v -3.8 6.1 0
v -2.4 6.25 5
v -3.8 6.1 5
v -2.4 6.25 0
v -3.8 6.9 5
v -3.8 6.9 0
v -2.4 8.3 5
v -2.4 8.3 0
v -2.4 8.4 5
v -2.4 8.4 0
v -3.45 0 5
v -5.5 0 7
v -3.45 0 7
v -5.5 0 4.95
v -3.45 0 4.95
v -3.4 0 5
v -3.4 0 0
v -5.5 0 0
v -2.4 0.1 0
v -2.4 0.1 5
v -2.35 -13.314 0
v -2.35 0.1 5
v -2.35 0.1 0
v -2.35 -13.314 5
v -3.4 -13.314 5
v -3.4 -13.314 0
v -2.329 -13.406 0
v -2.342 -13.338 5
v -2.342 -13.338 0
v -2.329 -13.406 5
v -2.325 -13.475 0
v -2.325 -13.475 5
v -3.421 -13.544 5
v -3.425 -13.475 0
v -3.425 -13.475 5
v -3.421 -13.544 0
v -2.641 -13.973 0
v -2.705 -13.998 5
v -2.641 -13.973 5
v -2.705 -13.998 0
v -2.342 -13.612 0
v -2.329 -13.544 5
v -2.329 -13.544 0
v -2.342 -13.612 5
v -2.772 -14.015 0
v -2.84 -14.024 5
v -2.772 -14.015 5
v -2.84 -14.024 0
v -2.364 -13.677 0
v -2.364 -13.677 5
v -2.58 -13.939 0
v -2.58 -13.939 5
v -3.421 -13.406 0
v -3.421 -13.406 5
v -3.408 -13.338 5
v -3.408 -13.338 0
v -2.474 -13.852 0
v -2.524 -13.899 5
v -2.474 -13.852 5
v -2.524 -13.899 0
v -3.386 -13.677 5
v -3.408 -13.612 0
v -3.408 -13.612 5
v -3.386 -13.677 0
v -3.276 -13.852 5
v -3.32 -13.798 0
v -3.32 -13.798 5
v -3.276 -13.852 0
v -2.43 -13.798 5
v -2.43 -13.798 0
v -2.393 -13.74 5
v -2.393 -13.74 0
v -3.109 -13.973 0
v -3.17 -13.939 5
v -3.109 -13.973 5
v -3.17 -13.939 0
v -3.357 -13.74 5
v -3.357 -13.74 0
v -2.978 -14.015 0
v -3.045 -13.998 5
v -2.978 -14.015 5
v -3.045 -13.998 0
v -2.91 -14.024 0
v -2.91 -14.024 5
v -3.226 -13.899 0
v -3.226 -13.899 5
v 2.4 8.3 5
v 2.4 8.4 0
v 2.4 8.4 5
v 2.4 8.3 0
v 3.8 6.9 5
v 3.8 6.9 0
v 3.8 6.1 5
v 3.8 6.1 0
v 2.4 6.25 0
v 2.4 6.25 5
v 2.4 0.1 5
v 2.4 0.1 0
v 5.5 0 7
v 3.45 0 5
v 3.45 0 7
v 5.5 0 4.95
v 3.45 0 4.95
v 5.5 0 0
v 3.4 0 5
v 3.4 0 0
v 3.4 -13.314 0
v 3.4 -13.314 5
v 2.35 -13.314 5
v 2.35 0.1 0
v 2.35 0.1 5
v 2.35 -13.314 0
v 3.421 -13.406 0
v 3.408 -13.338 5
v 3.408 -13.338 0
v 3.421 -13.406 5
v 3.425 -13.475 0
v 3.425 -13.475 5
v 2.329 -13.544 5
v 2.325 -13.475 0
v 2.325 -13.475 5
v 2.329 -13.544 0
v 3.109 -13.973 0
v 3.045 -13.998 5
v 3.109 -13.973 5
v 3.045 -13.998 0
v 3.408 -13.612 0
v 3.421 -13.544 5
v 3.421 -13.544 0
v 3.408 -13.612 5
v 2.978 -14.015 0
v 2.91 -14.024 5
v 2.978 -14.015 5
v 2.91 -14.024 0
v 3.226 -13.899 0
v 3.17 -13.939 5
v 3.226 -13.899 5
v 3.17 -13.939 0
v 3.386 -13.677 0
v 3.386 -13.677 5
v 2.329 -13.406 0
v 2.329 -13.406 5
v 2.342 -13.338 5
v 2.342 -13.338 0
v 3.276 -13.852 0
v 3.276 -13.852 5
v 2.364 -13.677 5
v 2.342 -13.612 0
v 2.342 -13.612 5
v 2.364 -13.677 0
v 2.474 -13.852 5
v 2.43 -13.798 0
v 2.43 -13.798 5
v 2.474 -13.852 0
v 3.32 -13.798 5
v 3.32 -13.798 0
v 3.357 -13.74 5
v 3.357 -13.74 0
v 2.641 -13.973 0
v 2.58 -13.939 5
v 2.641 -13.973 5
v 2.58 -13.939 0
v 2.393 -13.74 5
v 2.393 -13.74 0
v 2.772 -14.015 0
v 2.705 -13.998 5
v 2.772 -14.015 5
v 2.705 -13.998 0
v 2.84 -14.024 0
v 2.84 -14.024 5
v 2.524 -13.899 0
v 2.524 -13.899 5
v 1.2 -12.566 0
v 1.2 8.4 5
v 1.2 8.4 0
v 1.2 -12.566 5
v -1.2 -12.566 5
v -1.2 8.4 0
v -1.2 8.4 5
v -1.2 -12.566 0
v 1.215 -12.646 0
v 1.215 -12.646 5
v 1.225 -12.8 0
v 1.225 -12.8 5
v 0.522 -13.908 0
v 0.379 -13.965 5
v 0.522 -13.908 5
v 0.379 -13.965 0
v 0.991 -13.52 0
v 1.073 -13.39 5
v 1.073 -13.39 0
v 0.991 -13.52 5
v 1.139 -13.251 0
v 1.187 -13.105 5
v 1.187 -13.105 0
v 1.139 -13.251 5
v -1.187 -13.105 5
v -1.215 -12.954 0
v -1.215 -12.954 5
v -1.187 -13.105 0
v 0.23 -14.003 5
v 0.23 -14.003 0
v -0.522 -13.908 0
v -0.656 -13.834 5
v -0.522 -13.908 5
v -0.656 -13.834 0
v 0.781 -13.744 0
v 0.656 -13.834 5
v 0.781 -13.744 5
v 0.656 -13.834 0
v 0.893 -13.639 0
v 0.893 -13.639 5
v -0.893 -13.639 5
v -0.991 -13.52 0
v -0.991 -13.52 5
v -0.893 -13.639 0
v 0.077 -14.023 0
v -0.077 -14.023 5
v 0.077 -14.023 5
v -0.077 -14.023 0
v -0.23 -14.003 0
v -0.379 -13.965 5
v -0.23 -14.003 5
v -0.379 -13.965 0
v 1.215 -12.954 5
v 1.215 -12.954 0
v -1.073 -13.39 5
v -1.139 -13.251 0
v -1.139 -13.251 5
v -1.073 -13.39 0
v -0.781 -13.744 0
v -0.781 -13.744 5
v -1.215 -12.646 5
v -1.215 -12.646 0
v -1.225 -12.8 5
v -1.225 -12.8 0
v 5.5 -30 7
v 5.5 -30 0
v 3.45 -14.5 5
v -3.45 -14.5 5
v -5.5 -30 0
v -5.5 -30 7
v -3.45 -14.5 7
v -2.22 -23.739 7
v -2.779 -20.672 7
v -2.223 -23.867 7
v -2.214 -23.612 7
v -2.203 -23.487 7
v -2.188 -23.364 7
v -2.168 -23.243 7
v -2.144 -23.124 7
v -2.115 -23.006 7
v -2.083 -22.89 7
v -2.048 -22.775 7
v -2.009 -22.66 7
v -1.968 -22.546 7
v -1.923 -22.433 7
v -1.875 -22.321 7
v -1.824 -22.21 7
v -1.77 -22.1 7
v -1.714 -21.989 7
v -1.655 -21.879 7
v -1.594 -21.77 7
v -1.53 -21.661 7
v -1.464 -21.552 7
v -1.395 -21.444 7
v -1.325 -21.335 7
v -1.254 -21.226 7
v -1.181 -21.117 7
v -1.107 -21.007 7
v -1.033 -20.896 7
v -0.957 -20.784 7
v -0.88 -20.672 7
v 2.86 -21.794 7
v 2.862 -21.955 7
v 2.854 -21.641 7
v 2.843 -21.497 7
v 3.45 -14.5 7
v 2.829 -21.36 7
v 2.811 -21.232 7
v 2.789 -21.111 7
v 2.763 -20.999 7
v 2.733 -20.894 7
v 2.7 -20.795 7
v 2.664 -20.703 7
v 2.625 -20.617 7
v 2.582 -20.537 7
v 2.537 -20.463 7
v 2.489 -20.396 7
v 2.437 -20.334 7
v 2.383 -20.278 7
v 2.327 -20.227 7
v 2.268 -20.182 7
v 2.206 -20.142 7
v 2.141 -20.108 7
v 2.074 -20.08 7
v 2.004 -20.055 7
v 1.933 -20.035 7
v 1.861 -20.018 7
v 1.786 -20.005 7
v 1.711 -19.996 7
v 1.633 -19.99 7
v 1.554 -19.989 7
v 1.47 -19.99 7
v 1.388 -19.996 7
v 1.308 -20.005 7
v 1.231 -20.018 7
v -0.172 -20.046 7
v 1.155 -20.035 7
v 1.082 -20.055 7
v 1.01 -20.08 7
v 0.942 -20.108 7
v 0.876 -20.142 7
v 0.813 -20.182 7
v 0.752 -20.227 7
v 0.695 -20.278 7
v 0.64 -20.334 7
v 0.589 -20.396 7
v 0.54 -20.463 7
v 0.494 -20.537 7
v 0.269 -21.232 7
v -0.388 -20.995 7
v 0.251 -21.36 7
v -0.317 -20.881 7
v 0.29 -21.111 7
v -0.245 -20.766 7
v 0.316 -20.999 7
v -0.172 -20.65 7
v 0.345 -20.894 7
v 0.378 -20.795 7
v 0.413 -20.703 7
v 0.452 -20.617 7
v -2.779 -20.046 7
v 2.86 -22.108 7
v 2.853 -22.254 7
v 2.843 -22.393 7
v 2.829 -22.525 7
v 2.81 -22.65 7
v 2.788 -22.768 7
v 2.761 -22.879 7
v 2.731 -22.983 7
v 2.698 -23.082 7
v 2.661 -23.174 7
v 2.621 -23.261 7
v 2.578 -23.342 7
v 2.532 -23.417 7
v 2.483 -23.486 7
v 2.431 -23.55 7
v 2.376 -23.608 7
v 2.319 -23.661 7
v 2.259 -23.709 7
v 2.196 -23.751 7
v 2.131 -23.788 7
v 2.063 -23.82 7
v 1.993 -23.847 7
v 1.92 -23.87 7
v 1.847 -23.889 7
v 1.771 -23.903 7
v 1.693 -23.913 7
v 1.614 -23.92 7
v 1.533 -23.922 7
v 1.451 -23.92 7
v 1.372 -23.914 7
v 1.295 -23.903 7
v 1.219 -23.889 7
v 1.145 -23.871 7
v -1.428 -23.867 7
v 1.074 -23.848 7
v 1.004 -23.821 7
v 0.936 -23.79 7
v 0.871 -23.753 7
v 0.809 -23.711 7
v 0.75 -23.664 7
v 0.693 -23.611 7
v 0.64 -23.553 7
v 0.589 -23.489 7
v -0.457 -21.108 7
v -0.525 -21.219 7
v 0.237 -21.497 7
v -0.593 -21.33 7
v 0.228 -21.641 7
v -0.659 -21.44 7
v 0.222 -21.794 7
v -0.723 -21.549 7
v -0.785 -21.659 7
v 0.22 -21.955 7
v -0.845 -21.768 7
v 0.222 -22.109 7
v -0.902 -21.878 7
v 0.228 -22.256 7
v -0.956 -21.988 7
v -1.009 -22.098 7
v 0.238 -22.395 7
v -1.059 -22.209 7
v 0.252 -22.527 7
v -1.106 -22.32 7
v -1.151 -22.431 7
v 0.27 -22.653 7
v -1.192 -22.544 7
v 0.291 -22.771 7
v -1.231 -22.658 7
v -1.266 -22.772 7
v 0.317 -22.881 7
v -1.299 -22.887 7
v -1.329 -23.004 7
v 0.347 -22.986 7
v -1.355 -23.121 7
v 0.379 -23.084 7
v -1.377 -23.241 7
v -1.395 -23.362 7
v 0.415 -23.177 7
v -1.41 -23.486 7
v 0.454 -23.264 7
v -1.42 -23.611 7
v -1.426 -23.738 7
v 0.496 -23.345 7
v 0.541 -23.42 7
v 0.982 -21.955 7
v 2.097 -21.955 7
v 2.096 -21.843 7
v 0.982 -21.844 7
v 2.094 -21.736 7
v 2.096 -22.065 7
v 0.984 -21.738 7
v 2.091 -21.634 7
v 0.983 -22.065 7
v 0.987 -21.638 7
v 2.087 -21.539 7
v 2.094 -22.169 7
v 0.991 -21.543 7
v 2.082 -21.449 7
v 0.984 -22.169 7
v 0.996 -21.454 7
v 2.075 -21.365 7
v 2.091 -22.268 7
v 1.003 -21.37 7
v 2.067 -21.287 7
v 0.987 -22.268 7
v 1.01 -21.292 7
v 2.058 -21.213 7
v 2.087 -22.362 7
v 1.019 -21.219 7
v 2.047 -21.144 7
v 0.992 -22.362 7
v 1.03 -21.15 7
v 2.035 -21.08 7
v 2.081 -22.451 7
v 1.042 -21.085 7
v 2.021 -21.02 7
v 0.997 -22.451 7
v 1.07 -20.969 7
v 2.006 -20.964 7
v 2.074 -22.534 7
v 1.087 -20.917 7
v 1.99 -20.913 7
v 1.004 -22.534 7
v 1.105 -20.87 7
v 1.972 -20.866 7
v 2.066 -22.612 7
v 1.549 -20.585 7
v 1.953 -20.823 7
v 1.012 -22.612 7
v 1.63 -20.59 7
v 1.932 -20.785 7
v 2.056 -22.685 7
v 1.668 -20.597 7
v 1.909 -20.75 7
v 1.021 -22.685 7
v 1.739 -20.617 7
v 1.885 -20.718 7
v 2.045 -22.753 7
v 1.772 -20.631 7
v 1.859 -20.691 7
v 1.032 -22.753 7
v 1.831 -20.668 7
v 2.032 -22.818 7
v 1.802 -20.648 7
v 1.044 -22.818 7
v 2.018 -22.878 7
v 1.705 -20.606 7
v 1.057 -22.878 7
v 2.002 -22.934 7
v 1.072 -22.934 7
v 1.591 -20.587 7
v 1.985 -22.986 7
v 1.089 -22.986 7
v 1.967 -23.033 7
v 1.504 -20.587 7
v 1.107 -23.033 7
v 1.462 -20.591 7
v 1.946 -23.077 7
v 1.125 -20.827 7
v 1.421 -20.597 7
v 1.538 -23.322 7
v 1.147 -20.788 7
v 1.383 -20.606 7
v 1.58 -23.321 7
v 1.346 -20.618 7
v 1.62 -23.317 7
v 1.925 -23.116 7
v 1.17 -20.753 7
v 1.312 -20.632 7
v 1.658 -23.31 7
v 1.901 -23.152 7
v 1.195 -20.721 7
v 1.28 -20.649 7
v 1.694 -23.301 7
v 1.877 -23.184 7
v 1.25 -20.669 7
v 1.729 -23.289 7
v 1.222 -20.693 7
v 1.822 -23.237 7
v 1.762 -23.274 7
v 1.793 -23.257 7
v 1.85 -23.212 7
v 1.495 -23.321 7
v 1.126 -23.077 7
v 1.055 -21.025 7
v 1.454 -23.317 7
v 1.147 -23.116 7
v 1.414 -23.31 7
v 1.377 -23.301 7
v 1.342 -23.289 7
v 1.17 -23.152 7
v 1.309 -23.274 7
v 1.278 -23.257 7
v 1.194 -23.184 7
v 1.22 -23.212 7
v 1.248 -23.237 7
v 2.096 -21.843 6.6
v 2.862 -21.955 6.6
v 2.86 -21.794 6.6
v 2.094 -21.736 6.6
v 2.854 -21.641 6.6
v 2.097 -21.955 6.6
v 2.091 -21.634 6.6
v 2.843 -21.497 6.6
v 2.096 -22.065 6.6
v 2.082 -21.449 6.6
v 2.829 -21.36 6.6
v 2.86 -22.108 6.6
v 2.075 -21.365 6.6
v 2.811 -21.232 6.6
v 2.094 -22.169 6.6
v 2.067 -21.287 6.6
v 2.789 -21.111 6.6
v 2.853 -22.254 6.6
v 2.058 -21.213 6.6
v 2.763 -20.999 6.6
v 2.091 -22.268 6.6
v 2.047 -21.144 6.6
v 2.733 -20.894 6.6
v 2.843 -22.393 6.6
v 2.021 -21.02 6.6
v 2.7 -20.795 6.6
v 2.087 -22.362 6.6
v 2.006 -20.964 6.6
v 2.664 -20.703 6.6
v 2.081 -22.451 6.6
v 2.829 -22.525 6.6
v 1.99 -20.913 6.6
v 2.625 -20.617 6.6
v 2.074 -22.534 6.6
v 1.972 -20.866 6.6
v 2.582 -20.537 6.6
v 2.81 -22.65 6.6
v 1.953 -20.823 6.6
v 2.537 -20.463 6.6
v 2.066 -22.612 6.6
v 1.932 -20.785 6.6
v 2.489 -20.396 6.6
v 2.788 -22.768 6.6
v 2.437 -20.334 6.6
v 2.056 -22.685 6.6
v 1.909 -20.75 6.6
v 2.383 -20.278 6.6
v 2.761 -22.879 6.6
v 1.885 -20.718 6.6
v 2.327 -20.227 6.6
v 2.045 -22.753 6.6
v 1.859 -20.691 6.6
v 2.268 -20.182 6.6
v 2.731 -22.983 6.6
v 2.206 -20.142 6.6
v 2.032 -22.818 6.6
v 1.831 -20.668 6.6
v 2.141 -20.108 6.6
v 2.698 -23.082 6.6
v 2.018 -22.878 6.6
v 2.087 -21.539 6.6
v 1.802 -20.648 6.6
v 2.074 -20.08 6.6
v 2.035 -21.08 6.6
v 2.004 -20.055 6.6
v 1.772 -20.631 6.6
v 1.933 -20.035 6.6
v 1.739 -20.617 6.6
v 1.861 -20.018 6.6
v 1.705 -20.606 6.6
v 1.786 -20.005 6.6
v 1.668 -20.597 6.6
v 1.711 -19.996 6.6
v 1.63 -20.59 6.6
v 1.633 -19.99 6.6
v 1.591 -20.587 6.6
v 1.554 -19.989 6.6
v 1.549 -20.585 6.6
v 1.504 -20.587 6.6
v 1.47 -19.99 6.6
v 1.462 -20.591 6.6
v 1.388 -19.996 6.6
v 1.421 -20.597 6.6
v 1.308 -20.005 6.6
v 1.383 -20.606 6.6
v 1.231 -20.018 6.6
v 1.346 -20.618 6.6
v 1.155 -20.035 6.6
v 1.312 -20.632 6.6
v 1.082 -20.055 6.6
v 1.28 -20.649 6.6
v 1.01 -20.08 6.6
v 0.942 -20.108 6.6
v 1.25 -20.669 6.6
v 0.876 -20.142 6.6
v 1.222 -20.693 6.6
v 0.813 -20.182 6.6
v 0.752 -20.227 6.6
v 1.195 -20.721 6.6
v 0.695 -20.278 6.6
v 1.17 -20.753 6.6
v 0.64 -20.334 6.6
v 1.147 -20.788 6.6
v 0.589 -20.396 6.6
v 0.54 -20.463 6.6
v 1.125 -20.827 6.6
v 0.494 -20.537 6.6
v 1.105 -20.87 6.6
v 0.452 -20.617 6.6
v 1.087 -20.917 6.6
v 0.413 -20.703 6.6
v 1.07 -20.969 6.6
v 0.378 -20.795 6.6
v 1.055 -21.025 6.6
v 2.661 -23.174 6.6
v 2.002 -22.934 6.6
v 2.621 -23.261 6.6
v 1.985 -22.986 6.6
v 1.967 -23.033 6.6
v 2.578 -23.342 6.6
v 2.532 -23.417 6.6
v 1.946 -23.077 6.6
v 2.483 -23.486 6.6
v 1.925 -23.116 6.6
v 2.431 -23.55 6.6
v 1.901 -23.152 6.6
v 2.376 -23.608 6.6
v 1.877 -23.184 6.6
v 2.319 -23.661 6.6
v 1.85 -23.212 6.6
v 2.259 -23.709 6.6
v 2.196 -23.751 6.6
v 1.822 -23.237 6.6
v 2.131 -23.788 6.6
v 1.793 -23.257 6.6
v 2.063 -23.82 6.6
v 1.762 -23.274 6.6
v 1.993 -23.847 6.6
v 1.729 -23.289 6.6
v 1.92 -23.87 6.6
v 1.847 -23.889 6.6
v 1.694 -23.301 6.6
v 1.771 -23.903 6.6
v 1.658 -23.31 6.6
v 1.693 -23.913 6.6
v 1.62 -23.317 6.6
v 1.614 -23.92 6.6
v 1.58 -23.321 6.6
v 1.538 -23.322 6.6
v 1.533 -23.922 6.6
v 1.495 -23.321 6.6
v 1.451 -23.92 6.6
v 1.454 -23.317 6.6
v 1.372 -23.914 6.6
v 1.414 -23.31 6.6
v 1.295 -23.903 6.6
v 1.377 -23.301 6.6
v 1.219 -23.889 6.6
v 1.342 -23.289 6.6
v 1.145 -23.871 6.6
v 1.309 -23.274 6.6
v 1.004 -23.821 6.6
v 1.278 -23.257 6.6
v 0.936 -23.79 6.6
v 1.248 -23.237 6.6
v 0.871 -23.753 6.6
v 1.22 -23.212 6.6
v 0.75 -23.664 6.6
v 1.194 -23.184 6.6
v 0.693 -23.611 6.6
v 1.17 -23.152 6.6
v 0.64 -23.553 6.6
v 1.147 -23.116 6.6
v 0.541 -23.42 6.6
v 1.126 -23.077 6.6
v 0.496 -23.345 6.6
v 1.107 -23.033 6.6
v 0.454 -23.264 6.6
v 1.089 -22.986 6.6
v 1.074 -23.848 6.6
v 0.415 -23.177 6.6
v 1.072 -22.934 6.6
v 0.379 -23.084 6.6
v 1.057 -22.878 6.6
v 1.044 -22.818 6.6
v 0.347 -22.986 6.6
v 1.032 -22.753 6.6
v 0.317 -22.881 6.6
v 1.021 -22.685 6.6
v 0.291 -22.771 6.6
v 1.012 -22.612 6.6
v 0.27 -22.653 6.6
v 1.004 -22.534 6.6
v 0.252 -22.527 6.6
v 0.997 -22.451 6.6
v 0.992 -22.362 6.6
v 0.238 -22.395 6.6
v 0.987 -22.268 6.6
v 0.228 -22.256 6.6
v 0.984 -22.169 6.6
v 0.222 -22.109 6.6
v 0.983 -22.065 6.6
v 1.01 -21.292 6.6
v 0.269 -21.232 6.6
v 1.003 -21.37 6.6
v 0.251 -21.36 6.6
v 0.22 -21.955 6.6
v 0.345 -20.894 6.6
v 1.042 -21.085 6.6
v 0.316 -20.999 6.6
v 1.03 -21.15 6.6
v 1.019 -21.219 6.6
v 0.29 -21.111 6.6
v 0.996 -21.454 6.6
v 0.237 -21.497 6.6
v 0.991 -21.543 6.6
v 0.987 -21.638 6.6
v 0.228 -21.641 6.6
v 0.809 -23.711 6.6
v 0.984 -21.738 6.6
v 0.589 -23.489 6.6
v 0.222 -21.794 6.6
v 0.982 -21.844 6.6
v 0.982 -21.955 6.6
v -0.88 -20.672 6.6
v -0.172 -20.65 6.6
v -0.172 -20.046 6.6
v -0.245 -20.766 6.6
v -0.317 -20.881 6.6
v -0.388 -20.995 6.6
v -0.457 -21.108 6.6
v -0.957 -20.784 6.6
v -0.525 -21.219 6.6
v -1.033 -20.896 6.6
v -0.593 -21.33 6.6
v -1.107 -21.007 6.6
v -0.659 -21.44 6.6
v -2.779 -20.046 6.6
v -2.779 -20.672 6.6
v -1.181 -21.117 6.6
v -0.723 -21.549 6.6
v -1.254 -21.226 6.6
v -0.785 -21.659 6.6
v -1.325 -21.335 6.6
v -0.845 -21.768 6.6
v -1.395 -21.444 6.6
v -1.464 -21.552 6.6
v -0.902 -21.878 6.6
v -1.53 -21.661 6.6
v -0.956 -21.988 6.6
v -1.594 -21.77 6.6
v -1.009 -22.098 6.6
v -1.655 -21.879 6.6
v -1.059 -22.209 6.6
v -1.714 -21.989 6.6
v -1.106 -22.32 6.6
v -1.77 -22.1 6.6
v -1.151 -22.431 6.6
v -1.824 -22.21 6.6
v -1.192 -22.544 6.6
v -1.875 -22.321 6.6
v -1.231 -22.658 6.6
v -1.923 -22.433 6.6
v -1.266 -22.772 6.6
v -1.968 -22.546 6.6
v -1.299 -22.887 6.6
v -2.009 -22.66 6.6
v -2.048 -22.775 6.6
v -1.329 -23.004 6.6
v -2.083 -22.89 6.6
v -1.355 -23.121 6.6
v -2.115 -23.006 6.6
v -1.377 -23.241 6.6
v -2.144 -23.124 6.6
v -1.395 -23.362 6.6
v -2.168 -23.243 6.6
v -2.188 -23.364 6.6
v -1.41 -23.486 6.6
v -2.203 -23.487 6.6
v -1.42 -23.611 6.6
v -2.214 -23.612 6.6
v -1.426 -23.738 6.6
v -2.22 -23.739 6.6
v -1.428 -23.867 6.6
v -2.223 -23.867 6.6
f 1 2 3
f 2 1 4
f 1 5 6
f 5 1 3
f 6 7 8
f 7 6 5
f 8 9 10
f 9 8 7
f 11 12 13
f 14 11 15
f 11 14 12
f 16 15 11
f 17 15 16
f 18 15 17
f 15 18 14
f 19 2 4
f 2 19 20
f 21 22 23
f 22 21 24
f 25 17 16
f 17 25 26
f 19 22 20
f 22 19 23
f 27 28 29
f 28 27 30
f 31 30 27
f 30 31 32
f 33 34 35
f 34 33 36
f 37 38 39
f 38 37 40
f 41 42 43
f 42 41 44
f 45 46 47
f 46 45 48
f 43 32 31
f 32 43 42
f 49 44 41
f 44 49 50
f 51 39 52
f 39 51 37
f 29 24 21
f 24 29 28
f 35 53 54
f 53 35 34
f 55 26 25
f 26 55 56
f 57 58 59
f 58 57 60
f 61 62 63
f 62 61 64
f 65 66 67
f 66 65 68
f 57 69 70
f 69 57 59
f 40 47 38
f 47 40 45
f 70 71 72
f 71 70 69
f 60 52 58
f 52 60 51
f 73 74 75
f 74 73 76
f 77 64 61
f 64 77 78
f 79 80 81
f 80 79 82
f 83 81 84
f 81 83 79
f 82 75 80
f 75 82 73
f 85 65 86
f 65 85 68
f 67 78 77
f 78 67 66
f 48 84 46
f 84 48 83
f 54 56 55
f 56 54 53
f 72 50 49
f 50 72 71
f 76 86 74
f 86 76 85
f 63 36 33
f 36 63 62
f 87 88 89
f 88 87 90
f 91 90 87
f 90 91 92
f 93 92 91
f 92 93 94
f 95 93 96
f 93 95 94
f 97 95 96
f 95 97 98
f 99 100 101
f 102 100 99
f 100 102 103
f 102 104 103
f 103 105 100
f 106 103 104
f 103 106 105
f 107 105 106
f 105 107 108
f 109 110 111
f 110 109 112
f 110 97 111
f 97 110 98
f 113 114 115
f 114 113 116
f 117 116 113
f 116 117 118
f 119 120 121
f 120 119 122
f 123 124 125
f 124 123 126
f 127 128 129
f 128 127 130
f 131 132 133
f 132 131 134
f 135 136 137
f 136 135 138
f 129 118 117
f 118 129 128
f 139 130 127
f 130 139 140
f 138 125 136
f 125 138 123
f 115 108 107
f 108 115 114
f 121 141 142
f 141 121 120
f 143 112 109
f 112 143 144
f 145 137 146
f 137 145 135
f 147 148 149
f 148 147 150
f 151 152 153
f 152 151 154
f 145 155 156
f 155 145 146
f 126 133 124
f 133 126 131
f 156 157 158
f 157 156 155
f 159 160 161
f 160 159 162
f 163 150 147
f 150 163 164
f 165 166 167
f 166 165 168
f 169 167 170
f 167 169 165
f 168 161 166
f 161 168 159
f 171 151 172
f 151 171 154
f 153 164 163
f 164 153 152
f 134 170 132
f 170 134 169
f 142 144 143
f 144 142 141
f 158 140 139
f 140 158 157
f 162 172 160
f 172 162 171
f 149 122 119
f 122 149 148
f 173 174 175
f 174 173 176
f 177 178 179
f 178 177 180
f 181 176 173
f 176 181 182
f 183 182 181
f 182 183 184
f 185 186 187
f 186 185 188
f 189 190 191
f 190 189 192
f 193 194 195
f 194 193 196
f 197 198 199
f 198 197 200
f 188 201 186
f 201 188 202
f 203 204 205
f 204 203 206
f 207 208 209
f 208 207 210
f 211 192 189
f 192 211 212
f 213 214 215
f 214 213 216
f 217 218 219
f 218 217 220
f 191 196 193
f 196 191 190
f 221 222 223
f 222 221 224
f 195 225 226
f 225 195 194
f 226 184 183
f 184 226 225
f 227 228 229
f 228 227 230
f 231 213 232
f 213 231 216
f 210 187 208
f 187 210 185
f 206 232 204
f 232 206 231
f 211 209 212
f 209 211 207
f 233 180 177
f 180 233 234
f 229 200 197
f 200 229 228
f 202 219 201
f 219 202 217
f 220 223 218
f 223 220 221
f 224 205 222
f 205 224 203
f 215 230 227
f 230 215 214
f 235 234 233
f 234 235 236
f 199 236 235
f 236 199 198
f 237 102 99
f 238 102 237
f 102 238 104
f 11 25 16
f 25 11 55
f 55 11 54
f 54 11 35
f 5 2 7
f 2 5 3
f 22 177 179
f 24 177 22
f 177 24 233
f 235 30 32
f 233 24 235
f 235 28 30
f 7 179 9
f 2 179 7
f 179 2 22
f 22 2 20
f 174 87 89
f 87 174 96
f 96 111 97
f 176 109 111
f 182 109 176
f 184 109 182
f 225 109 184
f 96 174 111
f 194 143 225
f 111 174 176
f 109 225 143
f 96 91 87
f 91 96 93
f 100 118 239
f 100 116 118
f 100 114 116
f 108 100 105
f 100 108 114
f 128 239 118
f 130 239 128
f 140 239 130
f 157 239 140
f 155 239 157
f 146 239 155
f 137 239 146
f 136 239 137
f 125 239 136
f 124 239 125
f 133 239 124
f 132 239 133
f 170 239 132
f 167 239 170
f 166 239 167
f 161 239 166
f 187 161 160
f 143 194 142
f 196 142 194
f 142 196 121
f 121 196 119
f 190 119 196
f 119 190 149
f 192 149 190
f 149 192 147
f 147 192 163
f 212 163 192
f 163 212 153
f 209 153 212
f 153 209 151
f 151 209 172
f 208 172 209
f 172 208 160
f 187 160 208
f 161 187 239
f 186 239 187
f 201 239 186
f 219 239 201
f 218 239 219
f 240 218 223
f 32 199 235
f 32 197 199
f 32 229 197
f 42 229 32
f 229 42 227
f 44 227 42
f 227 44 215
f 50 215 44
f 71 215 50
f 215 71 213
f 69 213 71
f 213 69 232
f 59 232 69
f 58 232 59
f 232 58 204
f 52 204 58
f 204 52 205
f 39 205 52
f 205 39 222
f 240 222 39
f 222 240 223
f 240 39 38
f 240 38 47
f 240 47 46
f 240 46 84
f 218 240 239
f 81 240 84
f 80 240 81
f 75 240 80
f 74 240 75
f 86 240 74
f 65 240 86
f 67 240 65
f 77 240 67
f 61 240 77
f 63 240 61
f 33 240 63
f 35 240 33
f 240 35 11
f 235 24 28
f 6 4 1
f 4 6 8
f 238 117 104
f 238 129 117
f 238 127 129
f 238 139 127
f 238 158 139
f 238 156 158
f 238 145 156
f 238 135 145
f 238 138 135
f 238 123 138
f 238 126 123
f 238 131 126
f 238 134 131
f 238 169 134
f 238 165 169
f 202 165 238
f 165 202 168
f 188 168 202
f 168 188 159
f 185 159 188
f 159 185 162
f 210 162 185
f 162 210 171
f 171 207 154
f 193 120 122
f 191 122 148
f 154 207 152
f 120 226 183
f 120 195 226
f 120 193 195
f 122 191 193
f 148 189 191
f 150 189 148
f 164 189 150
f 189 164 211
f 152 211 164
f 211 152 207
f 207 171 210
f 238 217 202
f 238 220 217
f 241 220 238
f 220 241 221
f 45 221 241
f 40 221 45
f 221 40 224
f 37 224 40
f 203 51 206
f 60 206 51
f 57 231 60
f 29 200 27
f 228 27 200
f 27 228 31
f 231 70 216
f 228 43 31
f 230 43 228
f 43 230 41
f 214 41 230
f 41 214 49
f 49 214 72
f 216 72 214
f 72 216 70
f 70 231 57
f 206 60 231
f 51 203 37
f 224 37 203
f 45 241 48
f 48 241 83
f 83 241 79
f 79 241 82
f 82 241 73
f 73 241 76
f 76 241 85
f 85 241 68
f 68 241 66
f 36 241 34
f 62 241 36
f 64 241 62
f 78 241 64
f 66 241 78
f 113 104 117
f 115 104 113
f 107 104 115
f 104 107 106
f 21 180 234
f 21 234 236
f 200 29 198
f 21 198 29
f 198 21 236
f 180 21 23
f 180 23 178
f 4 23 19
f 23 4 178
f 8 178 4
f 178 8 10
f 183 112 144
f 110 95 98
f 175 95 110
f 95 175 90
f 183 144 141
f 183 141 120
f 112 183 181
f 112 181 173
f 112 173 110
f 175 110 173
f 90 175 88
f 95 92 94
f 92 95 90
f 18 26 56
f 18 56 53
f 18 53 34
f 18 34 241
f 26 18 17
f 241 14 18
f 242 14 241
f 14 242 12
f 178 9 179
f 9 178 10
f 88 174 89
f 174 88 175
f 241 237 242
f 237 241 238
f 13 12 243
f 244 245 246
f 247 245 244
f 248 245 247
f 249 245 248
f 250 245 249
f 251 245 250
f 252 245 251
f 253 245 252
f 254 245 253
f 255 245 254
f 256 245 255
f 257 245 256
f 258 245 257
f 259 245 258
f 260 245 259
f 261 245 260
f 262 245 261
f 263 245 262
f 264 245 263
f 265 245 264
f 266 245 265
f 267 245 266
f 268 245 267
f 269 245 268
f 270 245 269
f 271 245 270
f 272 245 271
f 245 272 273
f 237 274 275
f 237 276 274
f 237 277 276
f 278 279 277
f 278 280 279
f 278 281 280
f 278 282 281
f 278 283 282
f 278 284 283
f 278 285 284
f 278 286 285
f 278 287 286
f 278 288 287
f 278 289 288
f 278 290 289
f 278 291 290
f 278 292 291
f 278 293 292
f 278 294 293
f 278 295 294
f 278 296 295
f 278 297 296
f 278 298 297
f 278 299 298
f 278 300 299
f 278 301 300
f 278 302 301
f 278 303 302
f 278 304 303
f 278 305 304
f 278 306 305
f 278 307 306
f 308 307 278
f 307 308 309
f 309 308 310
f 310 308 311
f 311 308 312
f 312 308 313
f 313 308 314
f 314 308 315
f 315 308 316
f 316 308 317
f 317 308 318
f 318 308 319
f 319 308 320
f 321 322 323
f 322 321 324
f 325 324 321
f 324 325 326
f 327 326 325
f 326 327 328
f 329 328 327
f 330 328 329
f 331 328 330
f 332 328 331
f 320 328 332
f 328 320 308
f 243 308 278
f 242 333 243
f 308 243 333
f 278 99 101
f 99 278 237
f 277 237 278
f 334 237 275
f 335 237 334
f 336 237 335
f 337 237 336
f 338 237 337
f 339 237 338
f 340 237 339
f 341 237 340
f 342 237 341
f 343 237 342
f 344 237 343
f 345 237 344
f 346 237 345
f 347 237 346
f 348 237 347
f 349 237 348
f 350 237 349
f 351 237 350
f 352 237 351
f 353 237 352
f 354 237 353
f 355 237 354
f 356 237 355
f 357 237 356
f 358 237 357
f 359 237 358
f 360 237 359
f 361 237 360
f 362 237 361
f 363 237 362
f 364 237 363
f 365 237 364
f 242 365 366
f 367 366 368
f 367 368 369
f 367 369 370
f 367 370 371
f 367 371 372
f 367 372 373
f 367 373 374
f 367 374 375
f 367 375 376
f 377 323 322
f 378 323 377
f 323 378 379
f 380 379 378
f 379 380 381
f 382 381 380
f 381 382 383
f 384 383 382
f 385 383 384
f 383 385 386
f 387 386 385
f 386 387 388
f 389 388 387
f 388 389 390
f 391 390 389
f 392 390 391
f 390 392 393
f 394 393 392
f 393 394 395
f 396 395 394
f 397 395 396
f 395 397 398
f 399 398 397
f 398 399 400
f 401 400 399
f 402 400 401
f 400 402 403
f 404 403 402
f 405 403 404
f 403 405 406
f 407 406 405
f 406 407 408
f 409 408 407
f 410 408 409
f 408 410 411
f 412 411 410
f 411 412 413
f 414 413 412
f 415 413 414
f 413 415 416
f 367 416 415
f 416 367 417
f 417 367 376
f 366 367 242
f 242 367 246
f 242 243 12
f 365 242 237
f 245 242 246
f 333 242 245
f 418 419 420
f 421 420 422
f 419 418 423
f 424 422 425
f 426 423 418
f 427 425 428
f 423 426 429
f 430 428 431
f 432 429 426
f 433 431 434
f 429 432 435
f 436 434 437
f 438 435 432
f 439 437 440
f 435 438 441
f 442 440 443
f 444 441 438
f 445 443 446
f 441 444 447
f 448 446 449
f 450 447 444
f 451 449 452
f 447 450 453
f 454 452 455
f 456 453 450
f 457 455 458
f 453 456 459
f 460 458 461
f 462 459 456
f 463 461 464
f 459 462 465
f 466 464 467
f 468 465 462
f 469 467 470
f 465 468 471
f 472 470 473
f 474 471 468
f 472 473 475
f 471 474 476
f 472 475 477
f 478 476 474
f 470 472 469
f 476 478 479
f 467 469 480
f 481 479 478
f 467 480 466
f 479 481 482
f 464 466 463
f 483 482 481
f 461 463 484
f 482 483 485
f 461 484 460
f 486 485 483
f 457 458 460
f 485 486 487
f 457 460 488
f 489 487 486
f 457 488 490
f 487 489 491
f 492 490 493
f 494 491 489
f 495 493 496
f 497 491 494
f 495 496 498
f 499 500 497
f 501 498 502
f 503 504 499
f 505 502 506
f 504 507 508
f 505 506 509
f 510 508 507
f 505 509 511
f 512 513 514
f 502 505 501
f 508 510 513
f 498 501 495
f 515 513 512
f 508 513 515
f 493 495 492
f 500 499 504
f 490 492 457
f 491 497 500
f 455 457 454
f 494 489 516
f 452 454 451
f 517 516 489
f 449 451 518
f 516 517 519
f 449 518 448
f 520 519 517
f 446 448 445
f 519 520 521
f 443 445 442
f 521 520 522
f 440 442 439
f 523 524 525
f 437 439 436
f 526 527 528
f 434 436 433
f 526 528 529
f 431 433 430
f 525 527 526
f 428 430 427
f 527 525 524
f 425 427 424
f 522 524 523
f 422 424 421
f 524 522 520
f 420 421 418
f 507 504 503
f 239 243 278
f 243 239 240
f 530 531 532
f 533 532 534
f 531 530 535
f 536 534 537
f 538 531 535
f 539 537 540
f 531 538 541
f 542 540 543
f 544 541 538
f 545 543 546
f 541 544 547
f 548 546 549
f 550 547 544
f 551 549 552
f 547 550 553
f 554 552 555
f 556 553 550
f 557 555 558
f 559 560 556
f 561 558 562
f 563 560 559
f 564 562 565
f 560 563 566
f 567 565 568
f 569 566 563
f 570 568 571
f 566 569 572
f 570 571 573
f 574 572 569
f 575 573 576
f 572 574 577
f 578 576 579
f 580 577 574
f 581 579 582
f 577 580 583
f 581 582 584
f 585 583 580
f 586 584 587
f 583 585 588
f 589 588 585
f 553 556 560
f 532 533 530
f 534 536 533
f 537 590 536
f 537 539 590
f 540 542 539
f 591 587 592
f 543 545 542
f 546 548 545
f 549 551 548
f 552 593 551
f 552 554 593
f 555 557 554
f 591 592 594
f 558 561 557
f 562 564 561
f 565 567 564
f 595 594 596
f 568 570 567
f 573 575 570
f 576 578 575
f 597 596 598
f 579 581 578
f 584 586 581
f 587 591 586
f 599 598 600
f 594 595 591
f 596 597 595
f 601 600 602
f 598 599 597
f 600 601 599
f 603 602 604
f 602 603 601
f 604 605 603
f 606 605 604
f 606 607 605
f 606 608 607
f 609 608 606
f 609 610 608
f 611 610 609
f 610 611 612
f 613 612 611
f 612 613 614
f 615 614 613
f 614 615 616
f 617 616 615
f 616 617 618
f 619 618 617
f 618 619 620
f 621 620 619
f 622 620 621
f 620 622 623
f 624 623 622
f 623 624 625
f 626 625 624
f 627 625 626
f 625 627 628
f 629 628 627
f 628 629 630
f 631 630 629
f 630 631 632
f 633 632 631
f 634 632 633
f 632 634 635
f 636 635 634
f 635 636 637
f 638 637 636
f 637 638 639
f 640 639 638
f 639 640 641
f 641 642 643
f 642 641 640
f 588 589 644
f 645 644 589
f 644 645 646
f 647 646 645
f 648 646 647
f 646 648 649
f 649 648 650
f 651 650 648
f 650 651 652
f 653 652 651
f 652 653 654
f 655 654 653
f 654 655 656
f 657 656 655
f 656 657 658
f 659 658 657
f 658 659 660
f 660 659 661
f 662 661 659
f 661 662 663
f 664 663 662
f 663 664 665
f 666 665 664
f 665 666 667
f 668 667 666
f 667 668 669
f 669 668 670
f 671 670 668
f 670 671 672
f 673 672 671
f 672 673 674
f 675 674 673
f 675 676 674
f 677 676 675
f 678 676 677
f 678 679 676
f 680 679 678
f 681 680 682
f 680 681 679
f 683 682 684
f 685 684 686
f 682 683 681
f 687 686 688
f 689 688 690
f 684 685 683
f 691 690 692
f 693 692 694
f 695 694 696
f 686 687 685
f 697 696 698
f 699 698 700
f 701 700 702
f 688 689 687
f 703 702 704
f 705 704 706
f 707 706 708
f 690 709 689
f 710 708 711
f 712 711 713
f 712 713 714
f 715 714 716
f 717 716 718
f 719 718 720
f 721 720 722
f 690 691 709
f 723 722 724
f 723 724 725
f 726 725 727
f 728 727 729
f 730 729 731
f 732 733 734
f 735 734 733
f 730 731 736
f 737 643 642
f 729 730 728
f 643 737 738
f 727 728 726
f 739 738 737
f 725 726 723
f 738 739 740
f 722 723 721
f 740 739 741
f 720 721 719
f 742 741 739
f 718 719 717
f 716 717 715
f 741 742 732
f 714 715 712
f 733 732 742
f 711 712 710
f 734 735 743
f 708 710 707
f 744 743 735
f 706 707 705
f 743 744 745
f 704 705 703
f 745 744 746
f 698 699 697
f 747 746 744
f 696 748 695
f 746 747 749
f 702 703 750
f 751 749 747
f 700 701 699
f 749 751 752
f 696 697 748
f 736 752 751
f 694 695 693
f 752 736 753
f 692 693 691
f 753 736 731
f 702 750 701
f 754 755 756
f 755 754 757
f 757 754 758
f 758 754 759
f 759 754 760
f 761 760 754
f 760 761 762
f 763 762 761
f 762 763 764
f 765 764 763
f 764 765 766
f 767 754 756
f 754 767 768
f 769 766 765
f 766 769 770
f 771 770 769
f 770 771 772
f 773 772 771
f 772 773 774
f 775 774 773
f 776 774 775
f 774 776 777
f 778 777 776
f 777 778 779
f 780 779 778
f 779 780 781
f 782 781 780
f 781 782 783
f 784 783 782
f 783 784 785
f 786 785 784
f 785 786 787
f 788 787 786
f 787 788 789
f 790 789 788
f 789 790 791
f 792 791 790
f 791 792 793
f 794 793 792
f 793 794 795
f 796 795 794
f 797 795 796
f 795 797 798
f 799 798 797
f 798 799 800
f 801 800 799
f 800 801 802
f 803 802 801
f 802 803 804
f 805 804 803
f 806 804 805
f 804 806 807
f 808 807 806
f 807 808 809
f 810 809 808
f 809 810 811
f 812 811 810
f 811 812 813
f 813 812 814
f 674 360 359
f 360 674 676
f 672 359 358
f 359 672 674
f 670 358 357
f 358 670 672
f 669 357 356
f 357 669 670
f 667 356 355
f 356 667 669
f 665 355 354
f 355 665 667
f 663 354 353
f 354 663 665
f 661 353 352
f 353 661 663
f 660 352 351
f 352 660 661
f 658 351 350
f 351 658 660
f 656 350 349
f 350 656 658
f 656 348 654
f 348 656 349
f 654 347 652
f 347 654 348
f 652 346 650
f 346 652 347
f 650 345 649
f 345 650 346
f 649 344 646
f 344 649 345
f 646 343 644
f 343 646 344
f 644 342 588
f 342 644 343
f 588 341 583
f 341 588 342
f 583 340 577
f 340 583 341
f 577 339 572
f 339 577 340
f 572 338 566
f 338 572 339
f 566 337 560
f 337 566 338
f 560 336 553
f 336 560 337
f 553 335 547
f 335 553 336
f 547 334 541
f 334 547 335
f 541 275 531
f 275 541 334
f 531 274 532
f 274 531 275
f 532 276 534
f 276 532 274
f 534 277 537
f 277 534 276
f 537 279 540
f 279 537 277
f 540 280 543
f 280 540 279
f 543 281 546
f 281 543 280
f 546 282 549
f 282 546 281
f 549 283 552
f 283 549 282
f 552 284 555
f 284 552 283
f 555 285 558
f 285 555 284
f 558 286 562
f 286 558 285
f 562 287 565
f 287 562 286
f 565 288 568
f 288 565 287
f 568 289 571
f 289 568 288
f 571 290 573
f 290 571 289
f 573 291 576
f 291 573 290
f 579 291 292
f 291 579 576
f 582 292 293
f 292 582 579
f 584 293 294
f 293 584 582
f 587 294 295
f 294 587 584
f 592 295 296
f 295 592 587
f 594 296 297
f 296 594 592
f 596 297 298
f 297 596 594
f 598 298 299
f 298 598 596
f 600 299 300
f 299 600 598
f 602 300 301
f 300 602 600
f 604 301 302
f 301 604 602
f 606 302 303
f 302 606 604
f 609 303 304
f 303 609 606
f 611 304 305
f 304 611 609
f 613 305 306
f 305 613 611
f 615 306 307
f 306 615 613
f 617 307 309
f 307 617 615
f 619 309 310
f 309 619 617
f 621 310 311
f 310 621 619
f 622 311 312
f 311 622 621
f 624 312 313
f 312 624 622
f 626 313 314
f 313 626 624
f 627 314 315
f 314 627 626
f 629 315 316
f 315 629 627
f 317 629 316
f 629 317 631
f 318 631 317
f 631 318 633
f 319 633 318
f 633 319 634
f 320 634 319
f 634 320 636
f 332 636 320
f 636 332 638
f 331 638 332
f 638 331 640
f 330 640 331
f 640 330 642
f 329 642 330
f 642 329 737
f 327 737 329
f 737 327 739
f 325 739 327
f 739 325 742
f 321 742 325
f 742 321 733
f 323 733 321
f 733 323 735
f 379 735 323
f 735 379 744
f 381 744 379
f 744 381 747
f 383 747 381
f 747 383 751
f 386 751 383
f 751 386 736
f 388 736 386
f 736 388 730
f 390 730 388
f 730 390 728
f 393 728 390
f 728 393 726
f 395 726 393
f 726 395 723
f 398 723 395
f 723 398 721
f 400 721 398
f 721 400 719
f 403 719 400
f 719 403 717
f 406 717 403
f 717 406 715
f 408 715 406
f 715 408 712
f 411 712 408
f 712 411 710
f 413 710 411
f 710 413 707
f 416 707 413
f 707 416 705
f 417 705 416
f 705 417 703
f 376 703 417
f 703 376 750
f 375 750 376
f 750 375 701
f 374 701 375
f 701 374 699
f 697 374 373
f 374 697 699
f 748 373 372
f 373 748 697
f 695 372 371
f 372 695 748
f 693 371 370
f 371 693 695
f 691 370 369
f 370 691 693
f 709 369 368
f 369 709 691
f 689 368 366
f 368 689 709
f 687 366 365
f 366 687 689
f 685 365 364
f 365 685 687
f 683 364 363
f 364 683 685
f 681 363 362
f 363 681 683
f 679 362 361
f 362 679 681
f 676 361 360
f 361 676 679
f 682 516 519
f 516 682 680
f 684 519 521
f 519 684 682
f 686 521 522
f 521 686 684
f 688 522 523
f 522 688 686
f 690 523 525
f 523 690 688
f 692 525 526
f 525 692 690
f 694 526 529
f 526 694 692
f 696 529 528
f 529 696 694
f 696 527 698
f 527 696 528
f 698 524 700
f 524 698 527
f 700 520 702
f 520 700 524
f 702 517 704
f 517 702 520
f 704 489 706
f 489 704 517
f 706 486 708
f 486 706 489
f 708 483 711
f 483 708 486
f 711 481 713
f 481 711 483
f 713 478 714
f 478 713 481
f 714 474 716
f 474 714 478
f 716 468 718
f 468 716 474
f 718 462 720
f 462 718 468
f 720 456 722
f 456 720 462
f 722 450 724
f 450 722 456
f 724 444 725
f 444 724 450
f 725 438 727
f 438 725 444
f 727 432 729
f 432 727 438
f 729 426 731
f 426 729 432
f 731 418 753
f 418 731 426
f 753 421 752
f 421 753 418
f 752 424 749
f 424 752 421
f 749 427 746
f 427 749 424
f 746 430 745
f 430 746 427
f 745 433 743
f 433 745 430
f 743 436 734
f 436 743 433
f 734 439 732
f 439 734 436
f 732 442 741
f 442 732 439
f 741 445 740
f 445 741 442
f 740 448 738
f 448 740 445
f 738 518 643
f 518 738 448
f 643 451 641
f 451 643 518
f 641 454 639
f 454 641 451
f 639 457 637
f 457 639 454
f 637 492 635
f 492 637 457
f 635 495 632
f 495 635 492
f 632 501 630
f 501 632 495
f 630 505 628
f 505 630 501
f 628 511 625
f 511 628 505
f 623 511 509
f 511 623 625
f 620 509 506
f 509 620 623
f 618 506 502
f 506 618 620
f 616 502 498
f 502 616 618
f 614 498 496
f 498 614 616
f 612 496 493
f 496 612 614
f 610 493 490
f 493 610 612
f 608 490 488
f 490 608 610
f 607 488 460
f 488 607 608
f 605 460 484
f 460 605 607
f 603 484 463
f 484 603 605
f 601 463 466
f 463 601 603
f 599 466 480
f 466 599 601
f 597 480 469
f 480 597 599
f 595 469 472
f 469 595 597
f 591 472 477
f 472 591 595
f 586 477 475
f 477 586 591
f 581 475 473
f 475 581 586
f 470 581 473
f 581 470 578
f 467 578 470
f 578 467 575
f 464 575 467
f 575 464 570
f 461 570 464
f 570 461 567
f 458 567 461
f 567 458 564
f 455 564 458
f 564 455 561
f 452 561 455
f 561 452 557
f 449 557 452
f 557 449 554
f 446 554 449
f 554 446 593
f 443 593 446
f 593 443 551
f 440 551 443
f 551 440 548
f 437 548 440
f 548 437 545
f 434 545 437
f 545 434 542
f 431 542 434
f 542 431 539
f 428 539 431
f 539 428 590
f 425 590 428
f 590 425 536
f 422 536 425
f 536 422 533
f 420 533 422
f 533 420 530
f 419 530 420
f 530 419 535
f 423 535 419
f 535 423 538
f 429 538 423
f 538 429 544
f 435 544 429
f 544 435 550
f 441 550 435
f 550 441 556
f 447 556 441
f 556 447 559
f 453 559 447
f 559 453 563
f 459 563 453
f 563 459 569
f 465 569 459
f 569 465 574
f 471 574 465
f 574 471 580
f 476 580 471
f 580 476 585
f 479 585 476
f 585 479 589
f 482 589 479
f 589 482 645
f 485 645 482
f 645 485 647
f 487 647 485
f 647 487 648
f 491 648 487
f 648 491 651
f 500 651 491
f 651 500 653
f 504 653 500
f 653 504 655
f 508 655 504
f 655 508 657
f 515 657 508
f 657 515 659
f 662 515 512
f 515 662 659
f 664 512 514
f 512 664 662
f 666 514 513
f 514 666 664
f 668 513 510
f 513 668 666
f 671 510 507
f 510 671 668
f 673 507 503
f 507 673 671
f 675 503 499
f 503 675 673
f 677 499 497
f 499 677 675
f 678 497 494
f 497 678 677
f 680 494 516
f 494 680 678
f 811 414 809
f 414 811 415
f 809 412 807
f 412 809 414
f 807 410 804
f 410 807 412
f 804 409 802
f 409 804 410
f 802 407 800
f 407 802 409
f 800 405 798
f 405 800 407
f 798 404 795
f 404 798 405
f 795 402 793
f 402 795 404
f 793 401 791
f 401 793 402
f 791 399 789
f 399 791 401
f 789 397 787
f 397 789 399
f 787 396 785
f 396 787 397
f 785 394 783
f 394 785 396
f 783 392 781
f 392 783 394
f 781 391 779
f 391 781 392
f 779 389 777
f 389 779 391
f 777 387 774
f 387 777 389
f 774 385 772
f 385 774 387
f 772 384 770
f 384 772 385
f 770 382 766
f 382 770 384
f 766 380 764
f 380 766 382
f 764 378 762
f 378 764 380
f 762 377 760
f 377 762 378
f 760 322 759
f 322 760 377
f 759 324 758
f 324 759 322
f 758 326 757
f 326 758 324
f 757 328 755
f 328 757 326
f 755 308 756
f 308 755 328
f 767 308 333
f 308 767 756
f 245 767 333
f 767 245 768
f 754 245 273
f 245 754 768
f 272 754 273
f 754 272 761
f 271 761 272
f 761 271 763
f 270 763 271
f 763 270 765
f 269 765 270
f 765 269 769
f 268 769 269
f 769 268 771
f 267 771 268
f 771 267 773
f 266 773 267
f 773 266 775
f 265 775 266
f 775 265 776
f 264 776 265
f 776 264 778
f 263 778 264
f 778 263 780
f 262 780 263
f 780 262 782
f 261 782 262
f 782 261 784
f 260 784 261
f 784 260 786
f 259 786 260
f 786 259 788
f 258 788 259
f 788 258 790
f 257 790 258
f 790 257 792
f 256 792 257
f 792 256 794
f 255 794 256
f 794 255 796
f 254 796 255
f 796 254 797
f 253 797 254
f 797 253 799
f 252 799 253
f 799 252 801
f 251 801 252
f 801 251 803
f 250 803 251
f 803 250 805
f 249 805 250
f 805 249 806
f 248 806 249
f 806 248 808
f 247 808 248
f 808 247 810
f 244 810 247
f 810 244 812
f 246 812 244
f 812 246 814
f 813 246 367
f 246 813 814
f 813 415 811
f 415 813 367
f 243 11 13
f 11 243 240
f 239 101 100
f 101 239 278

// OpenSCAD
$fn = 50;

difference() {
	union() {
		translate(v = [0, 0, 0]) {
			rotate(a = [0, 0, 0]) {
				difference() {
					union() {
						translate(v = [0, 0, 0]) {
							rotate(a = [0, 0, 0]) {
								difference() {
									union() {
										translate(v = [-5.5, -30.0, 0]) {
											cube(size = [11.0, 38.4, 5.0]);
										}
									}
									union() {
										translate(v = [0, 0, -0.1]) {
											linear_extrude(height = 5.2) {
												polygon(points = [[-2.4, 0], [-2.4, 6.25], [-3.8, 6.1], [-3.8, 6.8999999999999995], [-2.4, 8.299999999999999], [-2.4, 9.399999999999999], [-5.7, 9.399999999999999], [-5.7, 0]]);
											}
										}
										translate(v = [0, 0, -0.1]) {
											linear_extrude(height = 5.2) {
												polygon(points = [[-2.35, -13.5], [-2.35, -13.1625], [-2.35, -12.825], [-2.35, -12.4875], [-2.35, -12.15], [-2.35, -11.8125], [-2.35, -11.475], [-2.35, -11.1375], [-2.35, -10.8], [-2.35, -10.4625], [-2.35, -10.125], [-2.35, -9.7875], [-2.35, -9.45], [-2.35, -9.1125], [-2.35, -8.775], [-2.35, -8.4375], [-2.35, -8.1], [-2.35, -7.7625], [-2.35, -7.425], [-2.35, -7.0875], [-2.35, -6.75], [-2.35, -6.4125], [-2.35, -6.075], [-2.35, -5.7375], [-2.35, -5.4], [-2.35, -5.0625], [-2.35, -4.725], [-2.35, -4.387499999999999], [-2.35, -4.050000000000001], [-2.35, -3.7125000000000004], [-2.35, -3.375], [-2.35, -3.0374999999999996], [-2.35, -2.6999999999999993], [-2.35, -2.3625000000000007], [-2.35, -2.0250000000000004], [-2.35, -1.6875], [-2.35, -1.3499999999999996], [-2.35, -1.0124999999999993], [-2.35, -0.6750000000000007], [-2.35, -0.33750000000000036], [-2.35, 0.0], [-2.35, 0.1], [-3.4, 0.1], [-3.4, -13.5]]);
											}
										}
										translate(v = [-2.875, -13.475, -0.1]) {
											cylinder(h = 5.2, r = 0.55);
										}
										translate(v = [0, 0, -0.1]) {
											linear_extrude(height = 5.2) {
												polygon(points = [[2.4, 0], [2.4, 6.25], [3.8, 6.1], [3.8, 6.8999999999999995], [2.4, 8.299999999999999], [2.4, 9.399999999999999], [5.7, 9.399999999999999], [5.7, 0]]);
											}
										}
										translate(v = [0, 0, -0.1]) {
											linear_extrude(height = 5.2) {
												polygon(points = [[2.35, -13.5], [2.35, -13.1625], [2.35, -12.825], [2.35, -12.4875], [2.35, -12.15], [2.35, -11.8125], [2.35, -11.475], [2.35, -11.1375], [2.35, -10.8], [2.35, -10.4625], [2.35, -10.125], [2.35, -9.7875], [2.35, -9.45], [2.35, -9.1125], [2.35, -8.775], [2.35, -8.4375], [2.35, -8.1], [2.35, -7.7625], [2.35, -7.425], [2.35, -7.0875], [2.35, -6.75], [2.35, -6.4125], [2.35, -6.075], [2.35, -5.7375], [2.35, -5.4], [2.35, -5.0625], [2.35, -4.725], [2.35, -4.387499999999999], [2.35, -4.050000000000001], [2.35, -3.7125000000000004], [2.35, -3.375], [2.35, -3.0374999999999996], [2.35, -2.6999999999999993], [2.35, -2.3625000000000007], [2.35, -2.0250000000000004], [2.35, -1.6875], [2.35, -1.3499999999999996], [2.35, -1.0124999999999993], [2.35, -0.6750000000000007], [2.35, -0.33750000000000036], [2.35, 0.0], [2.35, 0.1], [3.4, 0.1], [3.4, -13.5]]);
											}
										}
										translate(v = [2.875, -13.475, -0.1]) {
											cylinder(h = 5.2, r = 0.55);
										}
										translate(v = [0, 0, -0.1]) {
											linear_extrude(height = 5.2) {
												polygon(points = [[-1.2, -12.850000000000001], [-1.2, -12.532142857142858], [-1.2, -12.214285714285715], [-1.2, -11.896428571428572], [-1.2, -11.57857142857143], [-1.2, -11.260714285714288], [-1.2, -10.942857142857145], [-1.2, -10.625000000000002], [-1.2, -10.307142857142859], [-1.2, -9.989285714285716], [-1.2, -9.671428571428573], [-1.2, -9.35357142857143], [-1.2, -9.035714285714286], [-1.2, -8.717857142857145], [-1.2, -8.400000000000002], [-1.2, -8.082142857142859], [-1.2, -7.764285714285716], [-1.2, -7.446428571428573], [-1.2, -7.12857142857143], [-1.2, -6.810714285714287], [-1.2, -6.492857142857145], [-1.2, -6.175000000000002], [-1.2, -5.8571428571428585], [-1.2, -5.5392857142857155], [-1.2, -5.221428571428572], [-1.2, -4.90357142857143], [-1.2, -4.585714285714287], [-1.2, -4.267857142857144], [-1.2, -3.950000000000001], [-1.2, -3.632142857142858], [-1.2, -3.314285714285715], [-1.2, -2.9964285714285737], [-1.2, -2.6785714285714306], [-1.2, -2.3607142857142875], [-1.2, -2.0428571428571445], [-1.2, -1.7250000000000014], [-1.2, -1.4071428571428584], [-1.2, -1.0892857142857153], [-1.2, -0.7714285714285722], [-1.2, -0.4535714285714292], [-1.2, -0.1357142857142879], [-1.2, 0], [-1.2, 0.18214285714285516], [-1.2, 0.4999999999999982], [-1.2, 0.8178571428571413], [-1.2, 1.1357142857142843], [-1.2, 1.4535714285714274], [-1.2, 1.7714285714285705], [-1.2, 2.0892857142857135], [-1.2, 2.4071428571428566], [-1.2, 2.724999999999998], [-1.2, 3.042857142857141], [-1.2, 3.360714285714284], [-1.2, 3.678571428571427], [-1.2, 3.99642857142857], [-1.2, 4.314285714285713], [-1.2, 4.632142857142856], [-1.2, 4.949999999999999], [-1.2, 5.267857142857142], [-1.2, 5.585714285714285], [-1.2, 5.9035714285714285], [-1.2, 6.1], [-1.2, 6.2214285714285715], [-1.2, 6.25], [-1.2, 6.539285714285715], [-1.2, 6.857142857142854], [-1.2, 7.174999999999997], [-1.2, 7.49285714285714], [-1.2, 7.810714285714283], [-1.2, 8.128571428571426], [-1.2, 8.44642857142857], [-1.2, 8.764285714285712], [-1.2, 9.082142857142856], [-1.2, 9.399999999999999], [1.2, 9.399999999999999], [1.2, 9.082142857142856], [1.2, 8.764285714285712], [1.2, 8.44642857142857], [1.2, 8.128571428571426], [1.2, 7.810714285714283], [1.2, 7.49285714285714], [1.2, 7.174999999999997], [1.2, 6.857142857142854], [1.2, 6.539285714285715], [1.2, 6.25], [1.2, 6.2214285714285715], [1.2, 6.1], [1.2, 5.9035714285714285], [1.2, 5.585714285714285], [1.2, 5.267857142857142], [1.2, 4.949999999999999], [1.2, 4.632142857142856], [1.2, 4.314285714285713], [1.2, 3.99642857142857], [1.2, 3.678571428571427], [1.2, 3.360714285714284], [1.2, 3.042857142857141], [1.2, 2.724999999999998], [1.2, 2.4071428571428566], [1.2, 2.0892857142857135], [1.2, 1.7714285714285705], [1.2, 1.4535714285714274], [1.2, 1.1357142857142843], [1.2, 0.8178571428571413], [1.2, 0.4999999999999982], [1.2, 0.18214285714285516], [1.2, 0], [1.2, -0.1357142857142879], [1.2, -0.4535714285714292], [1.2, -0.7714285714285722], [1.2, -1.0892857142857153], [1.2, -1.4071428571428584], [1.2, -1.7250000000000014], [1.2, -2.0428571428571445], [1.2, -2.3607142857142875], [1.2, -2.6785714285714306], [1.2, -2.9964285714285737], [1.2, -3.314285714285715], [1.2, -3.632142857142858], [1.2, -3.950000000000001], [1.2, -4.267857142857144], [1.2, -4.585714285714287], [1.2, -4.90357142857143], [1.2, -5.221428571428572], [1.2, -5.5392857142857155], [1.2, -5.8571428571428585], [1.2, -6.175000000000002], [1.2, -6.492857142857145], [1.2, -6.810714285714287], [1.2, -7.12857142857143], [1.2, -7.446428571428573], [1.2, -7.764285714285716], [1.2, -8.082142857142859], [1.2, -8.400000000000002], [1.2, -8.717857142857145], [1.2, -9.035714285714286], [1.2, -9.35357142857143], [1.2, -9.671428571428573], [1.2, -9.989285714285716], [1.2, -10.307142857142859], [1.2, -10.625000000000002], [1.2, -10.942857142857145], [1.2, -11.260714285714288], [1.2, -11.57857142857143], [1.2, -11.896428571428572], [1.2, -12.214285714285715], [1.2, -12.532142857142858], [1.2, -12.850000000000001]]);
											}
										}
										translate(v = [0, -12.8, -0.1]) {
											cylinder(h = 5.2, r = 1.2249999999999999);
										}
										translate(v = [0, -22, 6.6]) {
											linear_extrude(height = 0.5) {
												text(font = "Arial:style=Bold", halign = "center", size = 4.0, text = "70", valign = "center");
											}
										}
									}
								}
							}
						}
						translate(v = [0, 0, 0]) {
							rotate(a = [0, 0, 0]) {
								difference() {
									union() {
										translate(v = [-5.5, -30.0, 4.95]) {
											cube(size = [11.0, 15.5, 2.05]);
										}
									}
									union() {
										translate(v = [0, -22, 6.6]) {
											linear_extrude(height = 0.5) {
												text(font = "Arial:style=Bold", halign = "center", size = 4.0, text = "70", valign = "center");
											}
										}
									}
								}
							}
						}
						translate(v = [-5.5, -30.0, 4.95]) {
							cube(size = [2.0500000000000003, 30.0, 2.05]);
						}
						translate(v = [3.4499999999999997, -30.0, 4.95]) {
							cube(size = [2.0500000000000003, 30.0, 2.05]);
						}
					}
					union();
				}
			}
		}
	}
	union();
}
